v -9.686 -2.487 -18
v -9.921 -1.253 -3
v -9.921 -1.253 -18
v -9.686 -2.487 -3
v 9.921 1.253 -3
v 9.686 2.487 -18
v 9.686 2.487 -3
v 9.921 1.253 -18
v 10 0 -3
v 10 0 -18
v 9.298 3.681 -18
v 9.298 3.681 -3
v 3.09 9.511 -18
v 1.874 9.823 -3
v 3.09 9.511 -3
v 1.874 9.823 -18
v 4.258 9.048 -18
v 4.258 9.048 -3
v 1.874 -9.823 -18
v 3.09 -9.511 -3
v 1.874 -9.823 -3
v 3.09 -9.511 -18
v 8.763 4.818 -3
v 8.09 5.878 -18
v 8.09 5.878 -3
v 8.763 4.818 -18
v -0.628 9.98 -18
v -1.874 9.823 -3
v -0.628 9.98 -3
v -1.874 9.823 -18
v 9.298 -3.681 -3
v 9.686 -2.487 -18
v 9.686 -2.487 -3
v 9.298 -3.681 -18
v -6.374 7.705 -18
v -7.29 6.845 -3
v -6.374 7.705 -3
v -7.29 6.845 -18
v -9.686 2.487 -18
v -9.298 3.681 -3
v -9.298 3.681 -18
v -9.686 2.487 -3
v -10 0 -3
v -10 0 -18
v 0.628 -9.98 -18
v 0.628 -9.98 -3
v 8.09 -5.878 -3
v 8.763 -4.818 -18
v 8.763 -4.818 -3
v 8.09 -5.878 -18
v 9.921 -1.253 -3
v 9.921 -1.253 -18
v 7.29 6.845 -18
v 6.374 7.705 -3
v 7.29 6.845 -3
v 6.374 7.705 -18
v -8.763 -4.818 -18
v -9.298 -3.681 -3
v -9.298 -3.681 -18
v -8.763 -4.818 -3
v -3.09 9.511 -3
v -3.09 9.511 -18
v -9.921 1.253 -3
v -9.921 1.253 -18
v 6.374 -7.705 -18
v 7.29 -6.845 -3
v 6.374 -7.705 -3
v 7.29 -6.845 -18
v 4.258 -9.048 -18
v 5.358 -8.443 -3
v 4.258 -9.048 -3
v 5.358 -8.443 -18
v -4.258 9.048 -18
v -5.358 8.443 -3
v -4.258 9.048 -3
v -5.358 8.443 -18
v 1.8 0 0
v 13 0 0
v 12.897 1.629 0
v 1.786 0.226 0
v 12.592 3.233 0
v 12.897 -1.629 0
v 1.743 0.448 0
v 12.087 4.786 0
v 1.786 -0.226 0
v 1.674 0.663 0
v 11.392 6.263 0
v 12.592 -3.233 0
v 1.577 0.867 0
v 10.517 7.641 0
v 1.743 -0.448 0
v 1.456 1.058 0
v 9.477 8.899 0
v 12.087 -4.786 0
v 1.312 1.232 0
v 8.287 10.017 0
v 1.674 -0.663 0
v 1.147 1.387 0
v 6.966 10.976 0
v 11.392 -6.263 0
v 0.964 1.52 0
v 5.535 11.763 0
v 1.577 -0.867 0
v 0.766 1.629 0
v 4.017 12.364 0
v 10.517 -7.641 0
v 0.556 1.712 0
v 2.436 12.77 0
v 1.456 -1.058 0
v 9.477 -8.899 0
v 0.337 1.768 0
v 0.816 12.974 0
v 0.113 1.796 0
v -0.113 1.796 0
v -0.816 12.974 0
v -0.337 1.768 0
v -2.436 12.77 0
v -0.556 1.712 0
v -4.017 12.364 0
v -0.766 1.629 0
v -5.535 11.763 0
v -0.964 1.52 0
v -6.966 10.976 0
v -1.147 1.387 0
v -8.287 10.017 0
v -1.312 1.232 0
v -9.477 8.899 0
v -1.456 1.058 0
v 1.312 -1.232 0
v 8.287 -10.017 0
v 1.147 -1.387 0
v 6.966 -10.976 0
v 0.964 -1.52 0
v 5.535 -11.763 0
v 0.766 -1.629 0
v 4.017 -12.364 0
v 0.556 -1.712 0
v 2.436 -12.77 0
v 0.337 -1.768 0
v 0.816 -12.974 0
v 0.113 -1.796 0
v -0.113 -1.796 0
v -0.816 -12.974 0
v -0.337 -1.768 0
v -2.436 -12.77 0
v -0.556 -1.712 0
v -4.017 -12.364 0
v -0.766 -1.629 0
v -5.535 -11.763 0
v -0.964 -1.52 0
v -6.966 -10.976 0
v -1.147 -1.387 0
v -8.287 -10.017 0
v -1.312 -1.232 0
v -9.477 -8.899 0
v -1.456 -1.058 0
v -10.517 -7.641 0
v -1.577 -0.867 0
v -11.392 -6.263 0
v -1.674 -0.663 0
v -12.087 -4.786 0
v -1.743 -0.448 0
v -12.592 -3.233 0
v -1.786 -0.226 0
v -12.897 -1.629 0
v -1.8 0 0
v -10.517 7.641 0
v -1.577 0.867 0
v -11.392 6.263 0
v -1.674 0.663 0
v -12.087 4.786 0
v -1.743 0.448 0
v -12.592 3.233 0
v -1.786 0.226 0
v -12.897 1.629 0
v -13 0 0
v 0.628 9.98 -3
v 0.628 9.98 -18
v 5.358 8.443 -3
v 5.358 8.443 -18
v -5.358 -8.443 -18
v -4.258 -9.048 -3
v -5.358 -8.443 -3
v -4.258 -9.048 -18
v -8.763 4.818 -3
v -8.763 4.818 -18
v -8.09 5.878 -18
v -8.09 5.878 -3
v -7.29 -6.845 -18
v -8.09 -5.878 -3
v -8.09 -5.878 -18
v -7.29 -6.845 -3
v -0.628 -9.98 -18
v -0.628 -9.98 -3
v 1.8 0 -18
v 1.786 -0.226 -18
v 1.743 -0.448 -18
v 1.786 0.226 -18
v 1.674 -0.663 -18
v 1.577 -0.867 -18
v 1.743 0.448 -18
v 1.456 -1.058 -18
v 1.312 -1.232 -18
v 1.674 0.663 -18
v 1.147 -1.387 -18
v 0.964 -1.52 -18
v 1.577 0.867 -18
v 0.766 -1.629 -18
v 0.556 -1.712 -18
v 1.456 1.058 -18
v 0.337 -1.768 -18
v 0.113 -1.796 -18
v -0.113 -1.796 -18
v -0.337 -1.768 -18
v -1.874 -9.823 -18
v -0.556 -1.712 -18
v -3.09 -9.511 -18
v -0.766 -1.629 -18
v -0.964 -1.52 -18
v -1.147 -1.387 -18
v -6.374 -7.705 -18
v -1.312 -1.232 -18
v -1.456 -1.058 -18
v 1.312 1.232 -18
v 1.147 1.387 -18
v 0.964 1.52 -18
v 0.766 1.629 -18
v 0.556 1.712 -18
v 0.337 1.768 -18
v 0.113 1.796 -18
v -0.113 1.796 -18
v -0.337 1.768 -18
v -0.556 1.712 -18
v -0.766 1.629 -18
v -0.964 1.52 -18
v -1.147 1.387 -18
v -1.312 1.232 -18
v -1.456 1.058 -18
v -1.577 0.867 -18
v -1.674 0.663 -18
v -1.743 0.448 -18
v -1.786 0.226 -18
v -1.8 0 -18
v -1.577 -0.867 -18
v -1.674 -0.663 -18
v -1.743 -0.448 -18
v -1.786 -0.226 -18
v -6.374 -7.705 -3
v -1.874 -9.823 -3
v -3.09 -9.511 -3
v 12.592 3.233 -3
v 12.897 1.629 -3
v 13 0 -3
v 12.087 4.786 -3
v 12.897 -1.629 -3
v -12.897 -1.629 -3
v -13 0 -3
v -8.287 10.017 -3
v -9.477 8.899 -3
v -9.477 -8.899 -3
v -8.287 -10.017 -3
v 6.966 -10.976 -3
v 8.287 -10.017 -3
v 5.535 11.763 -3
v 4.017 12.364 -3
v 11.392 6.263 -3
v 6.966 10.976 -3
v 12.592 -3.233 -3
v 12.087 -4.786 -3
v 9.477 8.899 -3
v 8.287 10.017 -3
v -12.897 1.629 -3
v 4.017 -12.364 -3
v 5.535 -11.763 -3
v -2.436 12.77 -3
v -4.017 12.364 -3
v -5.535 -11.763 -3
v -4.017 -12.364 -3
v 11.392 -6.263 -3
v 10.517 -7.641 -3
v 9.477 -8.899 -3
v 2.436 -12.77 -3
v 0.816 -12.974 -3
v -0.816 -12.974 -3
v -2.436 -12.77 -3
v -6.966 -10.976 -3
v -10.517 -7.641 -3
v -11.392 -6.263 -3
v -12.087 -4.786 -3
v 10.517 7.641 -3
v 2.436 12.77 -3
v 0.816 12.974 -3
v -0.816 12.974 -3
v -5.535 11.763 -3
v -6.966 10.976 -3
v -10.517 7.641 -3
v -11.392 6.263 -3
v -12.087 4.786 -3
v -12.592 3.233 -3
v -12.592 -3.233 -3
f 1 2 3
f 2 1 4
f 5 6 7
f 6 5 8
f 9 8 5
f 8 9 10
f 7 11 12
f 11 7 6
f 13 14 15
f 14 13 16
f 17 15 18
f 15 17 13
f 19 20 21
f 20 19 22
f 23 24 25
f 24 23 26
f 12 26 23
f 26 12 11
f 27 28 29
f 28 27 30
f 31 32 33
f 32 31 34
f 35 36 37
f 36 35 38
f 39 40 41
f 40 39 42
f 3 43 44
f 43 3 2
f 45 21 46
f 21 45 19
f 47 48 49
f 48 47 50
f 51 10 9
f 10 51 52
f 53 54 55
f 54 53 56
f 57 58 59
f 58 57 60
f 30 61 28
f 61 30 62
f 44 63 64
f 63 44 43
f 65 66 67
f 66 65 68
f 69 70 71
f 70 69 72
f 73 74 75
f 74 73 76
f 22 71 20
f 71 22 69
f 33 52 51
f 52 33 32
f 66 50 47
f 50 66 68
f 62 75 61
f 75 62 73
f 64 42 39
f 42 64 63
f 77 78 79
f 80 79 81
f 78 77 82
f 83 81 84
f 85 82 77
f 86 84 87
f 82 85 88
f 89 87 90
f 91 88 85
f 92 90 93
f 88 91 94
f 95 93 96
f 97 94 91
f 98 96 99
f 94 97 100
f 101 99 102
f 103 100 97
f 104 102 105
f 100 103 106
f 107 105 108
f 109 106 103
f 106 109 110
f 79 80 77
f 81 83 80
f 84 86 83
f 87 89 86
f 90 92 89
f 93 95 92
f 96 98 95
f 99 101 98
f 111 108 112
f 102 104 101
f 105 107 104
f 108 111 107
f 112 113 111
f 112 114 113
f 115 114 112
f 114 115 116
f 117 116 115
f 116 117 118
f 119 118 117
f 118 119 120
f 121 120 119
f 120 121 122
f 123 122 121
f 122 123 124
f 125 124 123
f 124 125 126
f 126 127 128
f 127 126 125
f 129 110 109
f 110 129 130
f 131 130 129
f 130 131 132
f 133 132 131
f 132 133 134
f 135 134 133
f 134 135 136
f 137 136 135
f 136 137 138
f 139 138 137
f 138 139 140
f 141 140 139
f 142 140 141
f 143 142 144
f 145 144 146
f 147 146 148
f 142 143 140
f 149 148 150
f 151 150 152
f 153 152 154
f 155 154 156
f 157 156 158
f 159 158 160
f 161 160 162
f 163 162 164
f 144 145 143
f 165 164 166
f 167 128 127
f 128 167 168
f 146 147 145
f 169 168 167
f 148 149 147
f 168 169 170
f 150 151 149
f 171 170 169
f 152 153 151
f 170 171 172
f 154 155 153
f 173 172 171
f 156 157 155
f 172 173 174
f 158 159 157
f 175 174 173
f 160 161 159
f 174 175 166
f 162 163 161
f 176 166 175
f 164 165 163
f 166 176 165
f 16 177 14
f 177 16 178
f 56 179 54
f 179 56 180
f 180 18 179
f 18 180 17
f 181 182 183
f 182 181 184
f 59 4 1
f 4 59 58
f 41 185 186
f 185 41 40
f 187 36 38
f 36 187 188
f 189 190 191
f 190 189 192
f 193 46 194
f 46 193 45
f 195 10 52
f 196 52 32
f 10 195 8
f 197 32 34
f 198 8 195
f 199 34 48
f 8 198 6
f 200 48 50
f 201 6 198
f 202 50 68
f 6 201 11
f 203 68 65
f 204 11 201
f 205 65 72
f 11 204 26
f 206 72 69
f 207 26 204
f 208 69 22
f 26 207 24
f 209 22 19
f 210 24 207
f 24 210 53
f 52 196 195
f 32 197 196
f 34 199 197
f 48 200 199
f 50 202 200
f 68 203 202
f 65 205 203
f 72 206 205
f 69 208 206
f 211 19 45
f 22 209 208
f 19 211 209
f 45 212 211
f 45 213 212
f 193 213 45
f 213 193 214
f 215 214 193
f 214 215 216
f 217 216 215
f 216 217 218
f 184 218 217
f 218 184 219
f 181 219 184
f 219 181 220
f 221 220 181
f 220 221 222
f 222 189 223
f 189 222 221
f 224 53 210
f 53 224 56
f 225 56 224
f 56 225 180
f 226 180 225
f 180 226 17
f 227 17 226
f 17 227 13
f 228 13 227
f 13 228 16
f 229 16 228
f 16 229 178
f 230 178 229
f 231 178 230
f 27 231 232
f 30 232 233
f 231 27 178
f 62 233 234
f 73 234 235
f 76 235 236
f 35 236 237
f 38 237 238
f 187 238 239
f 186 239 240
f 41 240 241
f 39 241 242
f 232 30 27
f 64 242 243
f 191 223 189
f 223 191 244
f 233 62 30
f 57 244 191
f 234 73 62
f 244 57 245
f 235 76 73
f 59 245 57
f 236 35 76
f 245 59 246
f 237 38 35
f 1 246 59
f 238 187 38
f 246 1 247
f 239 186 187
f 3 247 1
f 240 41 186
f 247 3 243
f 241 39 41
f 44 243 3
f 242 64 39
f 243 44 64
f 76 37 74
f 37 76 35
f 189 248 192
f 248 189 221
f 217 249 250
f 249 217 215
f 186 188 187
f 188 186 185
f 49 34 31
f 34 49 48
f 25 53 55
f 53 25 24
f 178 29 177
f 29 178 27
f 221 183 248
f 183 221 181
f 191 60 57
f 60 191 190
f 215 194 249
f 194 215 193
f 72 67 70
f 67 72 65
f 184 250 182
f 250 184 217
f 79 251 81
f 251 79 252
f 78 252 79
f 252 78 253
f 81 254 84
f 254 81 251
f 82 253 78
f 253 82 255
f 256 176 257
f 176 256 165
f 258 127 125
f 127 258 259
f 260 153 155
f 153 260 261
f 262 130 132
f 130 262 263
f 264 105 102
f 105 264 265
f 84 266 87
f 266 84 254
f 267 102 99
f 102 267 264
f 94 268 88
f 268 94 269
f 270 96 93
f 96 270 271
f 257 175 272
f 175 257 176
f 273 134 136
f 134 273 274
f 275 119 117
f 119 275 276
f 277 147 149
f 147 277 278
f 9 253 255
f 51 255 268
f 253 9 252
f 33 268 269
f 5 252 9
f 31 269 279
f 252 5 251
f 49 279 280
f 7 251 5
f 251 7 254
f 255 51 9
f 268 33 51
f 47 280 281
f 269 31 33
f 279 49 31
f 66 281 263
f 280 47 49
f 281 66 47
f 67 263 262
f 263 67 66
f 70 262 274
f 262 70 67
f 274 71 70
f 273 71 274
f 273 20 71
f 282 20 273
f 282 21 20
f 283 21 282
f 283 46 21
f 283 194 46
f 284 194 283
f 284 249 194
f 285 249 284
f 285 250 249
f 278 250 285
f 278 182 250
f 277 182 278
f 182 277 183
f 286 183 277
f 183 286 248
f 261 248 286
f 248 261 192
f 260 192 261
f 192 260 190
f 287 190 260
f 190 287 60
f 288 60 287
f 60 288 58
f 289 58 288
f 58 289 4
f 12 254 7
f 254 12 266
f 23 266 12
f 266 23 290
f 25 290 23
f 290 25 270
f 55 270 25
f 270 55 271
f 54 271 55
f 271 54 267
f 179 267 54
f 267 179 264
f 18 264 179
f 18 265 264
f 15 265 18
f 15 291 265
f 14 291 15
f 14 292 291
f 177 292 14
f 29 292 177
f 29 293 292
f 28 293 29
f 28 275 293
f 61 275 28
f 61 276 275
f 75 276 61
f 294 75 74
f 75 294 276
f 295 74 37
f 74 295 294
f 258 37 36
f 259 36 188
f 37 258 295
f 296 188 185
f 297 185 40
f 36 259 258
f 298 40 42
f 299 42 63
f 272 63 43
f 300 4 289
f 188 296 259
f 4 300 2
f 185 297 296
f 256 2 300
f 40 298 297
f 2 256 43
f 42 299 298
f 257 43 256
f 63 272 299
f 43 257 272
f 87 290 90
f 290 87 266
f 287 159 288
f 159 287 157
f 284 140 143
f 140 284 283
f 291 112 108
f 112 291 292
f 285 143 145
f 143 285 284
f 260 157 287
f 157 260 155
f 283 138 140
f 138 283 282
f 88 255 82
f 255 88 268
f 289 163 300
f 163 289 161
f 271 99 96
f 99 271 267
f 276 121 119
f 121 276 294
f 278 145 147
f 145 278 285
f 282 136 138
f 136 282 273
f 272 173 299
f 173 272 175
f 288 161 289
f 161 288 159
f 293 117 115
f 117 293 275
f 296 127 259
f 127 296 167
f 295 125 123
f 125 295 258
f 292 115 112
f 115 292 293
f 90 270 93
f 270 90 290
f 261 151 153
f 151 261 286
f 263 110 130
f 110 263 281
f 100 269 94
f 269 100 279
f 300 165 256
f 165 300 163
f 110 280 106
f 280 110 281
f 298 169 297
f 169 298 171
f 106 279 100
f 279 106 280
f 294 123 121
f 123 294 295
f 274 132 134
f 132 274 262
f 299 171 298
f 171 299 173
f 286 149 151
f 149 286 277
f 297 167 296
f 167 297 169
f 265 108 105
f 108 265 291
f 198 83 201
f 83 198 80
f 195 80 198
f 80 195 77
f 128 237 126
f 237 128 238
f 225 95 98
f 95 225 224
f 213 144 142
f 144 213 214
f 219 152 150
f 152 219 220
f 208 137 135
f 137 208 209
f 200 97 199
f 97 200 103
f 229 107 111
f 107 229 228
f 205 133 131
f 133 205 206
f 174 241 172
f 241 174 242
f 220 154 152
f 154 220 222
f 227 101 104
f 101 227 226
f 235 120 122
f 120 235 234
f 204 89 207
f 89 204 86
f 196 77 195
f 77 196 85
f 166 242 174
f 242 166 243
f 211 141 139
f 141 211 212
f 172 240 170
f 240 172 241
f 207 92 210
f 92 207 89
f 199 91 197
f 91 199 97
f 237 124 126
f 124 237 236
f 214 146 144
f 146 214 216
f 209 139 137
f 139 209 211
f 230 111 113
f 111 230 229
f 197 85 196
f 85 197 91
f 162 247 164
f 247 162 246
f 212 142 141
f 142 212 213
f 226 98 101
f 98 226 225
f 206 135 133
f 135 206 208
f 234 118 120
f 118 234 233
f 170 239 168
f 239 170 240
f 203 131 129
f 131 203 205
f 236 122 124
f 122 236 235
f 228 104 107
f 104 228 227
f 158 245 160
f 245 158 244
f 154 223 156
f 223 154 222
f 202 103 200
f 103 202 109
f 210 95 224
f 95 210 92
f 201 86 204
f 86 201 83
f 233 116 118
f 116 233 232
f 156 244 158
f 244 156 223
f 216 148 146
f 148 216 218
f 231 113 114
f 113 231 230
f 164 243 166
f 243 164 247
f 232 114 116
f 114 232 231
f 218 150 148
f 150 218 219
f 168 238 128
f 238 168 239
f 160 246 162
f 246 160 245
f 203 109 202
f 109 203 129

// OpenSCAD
$fn = 50;


difference() {
	union() {
		translate(v = [0, 0, -18.0000000000]) {
			cylinder(h = 18, r = 10.0000000000);
		}
		translate(v = [0, 0, -3.0000000000]) {
			cylinder(h = 3, r = 13.0000000000);
		}
	}
	union() {
		#translate(v = [0, 0, -18]) {
			cylinder(h = 18, r = 1.8000000000);
		}
	}
}
